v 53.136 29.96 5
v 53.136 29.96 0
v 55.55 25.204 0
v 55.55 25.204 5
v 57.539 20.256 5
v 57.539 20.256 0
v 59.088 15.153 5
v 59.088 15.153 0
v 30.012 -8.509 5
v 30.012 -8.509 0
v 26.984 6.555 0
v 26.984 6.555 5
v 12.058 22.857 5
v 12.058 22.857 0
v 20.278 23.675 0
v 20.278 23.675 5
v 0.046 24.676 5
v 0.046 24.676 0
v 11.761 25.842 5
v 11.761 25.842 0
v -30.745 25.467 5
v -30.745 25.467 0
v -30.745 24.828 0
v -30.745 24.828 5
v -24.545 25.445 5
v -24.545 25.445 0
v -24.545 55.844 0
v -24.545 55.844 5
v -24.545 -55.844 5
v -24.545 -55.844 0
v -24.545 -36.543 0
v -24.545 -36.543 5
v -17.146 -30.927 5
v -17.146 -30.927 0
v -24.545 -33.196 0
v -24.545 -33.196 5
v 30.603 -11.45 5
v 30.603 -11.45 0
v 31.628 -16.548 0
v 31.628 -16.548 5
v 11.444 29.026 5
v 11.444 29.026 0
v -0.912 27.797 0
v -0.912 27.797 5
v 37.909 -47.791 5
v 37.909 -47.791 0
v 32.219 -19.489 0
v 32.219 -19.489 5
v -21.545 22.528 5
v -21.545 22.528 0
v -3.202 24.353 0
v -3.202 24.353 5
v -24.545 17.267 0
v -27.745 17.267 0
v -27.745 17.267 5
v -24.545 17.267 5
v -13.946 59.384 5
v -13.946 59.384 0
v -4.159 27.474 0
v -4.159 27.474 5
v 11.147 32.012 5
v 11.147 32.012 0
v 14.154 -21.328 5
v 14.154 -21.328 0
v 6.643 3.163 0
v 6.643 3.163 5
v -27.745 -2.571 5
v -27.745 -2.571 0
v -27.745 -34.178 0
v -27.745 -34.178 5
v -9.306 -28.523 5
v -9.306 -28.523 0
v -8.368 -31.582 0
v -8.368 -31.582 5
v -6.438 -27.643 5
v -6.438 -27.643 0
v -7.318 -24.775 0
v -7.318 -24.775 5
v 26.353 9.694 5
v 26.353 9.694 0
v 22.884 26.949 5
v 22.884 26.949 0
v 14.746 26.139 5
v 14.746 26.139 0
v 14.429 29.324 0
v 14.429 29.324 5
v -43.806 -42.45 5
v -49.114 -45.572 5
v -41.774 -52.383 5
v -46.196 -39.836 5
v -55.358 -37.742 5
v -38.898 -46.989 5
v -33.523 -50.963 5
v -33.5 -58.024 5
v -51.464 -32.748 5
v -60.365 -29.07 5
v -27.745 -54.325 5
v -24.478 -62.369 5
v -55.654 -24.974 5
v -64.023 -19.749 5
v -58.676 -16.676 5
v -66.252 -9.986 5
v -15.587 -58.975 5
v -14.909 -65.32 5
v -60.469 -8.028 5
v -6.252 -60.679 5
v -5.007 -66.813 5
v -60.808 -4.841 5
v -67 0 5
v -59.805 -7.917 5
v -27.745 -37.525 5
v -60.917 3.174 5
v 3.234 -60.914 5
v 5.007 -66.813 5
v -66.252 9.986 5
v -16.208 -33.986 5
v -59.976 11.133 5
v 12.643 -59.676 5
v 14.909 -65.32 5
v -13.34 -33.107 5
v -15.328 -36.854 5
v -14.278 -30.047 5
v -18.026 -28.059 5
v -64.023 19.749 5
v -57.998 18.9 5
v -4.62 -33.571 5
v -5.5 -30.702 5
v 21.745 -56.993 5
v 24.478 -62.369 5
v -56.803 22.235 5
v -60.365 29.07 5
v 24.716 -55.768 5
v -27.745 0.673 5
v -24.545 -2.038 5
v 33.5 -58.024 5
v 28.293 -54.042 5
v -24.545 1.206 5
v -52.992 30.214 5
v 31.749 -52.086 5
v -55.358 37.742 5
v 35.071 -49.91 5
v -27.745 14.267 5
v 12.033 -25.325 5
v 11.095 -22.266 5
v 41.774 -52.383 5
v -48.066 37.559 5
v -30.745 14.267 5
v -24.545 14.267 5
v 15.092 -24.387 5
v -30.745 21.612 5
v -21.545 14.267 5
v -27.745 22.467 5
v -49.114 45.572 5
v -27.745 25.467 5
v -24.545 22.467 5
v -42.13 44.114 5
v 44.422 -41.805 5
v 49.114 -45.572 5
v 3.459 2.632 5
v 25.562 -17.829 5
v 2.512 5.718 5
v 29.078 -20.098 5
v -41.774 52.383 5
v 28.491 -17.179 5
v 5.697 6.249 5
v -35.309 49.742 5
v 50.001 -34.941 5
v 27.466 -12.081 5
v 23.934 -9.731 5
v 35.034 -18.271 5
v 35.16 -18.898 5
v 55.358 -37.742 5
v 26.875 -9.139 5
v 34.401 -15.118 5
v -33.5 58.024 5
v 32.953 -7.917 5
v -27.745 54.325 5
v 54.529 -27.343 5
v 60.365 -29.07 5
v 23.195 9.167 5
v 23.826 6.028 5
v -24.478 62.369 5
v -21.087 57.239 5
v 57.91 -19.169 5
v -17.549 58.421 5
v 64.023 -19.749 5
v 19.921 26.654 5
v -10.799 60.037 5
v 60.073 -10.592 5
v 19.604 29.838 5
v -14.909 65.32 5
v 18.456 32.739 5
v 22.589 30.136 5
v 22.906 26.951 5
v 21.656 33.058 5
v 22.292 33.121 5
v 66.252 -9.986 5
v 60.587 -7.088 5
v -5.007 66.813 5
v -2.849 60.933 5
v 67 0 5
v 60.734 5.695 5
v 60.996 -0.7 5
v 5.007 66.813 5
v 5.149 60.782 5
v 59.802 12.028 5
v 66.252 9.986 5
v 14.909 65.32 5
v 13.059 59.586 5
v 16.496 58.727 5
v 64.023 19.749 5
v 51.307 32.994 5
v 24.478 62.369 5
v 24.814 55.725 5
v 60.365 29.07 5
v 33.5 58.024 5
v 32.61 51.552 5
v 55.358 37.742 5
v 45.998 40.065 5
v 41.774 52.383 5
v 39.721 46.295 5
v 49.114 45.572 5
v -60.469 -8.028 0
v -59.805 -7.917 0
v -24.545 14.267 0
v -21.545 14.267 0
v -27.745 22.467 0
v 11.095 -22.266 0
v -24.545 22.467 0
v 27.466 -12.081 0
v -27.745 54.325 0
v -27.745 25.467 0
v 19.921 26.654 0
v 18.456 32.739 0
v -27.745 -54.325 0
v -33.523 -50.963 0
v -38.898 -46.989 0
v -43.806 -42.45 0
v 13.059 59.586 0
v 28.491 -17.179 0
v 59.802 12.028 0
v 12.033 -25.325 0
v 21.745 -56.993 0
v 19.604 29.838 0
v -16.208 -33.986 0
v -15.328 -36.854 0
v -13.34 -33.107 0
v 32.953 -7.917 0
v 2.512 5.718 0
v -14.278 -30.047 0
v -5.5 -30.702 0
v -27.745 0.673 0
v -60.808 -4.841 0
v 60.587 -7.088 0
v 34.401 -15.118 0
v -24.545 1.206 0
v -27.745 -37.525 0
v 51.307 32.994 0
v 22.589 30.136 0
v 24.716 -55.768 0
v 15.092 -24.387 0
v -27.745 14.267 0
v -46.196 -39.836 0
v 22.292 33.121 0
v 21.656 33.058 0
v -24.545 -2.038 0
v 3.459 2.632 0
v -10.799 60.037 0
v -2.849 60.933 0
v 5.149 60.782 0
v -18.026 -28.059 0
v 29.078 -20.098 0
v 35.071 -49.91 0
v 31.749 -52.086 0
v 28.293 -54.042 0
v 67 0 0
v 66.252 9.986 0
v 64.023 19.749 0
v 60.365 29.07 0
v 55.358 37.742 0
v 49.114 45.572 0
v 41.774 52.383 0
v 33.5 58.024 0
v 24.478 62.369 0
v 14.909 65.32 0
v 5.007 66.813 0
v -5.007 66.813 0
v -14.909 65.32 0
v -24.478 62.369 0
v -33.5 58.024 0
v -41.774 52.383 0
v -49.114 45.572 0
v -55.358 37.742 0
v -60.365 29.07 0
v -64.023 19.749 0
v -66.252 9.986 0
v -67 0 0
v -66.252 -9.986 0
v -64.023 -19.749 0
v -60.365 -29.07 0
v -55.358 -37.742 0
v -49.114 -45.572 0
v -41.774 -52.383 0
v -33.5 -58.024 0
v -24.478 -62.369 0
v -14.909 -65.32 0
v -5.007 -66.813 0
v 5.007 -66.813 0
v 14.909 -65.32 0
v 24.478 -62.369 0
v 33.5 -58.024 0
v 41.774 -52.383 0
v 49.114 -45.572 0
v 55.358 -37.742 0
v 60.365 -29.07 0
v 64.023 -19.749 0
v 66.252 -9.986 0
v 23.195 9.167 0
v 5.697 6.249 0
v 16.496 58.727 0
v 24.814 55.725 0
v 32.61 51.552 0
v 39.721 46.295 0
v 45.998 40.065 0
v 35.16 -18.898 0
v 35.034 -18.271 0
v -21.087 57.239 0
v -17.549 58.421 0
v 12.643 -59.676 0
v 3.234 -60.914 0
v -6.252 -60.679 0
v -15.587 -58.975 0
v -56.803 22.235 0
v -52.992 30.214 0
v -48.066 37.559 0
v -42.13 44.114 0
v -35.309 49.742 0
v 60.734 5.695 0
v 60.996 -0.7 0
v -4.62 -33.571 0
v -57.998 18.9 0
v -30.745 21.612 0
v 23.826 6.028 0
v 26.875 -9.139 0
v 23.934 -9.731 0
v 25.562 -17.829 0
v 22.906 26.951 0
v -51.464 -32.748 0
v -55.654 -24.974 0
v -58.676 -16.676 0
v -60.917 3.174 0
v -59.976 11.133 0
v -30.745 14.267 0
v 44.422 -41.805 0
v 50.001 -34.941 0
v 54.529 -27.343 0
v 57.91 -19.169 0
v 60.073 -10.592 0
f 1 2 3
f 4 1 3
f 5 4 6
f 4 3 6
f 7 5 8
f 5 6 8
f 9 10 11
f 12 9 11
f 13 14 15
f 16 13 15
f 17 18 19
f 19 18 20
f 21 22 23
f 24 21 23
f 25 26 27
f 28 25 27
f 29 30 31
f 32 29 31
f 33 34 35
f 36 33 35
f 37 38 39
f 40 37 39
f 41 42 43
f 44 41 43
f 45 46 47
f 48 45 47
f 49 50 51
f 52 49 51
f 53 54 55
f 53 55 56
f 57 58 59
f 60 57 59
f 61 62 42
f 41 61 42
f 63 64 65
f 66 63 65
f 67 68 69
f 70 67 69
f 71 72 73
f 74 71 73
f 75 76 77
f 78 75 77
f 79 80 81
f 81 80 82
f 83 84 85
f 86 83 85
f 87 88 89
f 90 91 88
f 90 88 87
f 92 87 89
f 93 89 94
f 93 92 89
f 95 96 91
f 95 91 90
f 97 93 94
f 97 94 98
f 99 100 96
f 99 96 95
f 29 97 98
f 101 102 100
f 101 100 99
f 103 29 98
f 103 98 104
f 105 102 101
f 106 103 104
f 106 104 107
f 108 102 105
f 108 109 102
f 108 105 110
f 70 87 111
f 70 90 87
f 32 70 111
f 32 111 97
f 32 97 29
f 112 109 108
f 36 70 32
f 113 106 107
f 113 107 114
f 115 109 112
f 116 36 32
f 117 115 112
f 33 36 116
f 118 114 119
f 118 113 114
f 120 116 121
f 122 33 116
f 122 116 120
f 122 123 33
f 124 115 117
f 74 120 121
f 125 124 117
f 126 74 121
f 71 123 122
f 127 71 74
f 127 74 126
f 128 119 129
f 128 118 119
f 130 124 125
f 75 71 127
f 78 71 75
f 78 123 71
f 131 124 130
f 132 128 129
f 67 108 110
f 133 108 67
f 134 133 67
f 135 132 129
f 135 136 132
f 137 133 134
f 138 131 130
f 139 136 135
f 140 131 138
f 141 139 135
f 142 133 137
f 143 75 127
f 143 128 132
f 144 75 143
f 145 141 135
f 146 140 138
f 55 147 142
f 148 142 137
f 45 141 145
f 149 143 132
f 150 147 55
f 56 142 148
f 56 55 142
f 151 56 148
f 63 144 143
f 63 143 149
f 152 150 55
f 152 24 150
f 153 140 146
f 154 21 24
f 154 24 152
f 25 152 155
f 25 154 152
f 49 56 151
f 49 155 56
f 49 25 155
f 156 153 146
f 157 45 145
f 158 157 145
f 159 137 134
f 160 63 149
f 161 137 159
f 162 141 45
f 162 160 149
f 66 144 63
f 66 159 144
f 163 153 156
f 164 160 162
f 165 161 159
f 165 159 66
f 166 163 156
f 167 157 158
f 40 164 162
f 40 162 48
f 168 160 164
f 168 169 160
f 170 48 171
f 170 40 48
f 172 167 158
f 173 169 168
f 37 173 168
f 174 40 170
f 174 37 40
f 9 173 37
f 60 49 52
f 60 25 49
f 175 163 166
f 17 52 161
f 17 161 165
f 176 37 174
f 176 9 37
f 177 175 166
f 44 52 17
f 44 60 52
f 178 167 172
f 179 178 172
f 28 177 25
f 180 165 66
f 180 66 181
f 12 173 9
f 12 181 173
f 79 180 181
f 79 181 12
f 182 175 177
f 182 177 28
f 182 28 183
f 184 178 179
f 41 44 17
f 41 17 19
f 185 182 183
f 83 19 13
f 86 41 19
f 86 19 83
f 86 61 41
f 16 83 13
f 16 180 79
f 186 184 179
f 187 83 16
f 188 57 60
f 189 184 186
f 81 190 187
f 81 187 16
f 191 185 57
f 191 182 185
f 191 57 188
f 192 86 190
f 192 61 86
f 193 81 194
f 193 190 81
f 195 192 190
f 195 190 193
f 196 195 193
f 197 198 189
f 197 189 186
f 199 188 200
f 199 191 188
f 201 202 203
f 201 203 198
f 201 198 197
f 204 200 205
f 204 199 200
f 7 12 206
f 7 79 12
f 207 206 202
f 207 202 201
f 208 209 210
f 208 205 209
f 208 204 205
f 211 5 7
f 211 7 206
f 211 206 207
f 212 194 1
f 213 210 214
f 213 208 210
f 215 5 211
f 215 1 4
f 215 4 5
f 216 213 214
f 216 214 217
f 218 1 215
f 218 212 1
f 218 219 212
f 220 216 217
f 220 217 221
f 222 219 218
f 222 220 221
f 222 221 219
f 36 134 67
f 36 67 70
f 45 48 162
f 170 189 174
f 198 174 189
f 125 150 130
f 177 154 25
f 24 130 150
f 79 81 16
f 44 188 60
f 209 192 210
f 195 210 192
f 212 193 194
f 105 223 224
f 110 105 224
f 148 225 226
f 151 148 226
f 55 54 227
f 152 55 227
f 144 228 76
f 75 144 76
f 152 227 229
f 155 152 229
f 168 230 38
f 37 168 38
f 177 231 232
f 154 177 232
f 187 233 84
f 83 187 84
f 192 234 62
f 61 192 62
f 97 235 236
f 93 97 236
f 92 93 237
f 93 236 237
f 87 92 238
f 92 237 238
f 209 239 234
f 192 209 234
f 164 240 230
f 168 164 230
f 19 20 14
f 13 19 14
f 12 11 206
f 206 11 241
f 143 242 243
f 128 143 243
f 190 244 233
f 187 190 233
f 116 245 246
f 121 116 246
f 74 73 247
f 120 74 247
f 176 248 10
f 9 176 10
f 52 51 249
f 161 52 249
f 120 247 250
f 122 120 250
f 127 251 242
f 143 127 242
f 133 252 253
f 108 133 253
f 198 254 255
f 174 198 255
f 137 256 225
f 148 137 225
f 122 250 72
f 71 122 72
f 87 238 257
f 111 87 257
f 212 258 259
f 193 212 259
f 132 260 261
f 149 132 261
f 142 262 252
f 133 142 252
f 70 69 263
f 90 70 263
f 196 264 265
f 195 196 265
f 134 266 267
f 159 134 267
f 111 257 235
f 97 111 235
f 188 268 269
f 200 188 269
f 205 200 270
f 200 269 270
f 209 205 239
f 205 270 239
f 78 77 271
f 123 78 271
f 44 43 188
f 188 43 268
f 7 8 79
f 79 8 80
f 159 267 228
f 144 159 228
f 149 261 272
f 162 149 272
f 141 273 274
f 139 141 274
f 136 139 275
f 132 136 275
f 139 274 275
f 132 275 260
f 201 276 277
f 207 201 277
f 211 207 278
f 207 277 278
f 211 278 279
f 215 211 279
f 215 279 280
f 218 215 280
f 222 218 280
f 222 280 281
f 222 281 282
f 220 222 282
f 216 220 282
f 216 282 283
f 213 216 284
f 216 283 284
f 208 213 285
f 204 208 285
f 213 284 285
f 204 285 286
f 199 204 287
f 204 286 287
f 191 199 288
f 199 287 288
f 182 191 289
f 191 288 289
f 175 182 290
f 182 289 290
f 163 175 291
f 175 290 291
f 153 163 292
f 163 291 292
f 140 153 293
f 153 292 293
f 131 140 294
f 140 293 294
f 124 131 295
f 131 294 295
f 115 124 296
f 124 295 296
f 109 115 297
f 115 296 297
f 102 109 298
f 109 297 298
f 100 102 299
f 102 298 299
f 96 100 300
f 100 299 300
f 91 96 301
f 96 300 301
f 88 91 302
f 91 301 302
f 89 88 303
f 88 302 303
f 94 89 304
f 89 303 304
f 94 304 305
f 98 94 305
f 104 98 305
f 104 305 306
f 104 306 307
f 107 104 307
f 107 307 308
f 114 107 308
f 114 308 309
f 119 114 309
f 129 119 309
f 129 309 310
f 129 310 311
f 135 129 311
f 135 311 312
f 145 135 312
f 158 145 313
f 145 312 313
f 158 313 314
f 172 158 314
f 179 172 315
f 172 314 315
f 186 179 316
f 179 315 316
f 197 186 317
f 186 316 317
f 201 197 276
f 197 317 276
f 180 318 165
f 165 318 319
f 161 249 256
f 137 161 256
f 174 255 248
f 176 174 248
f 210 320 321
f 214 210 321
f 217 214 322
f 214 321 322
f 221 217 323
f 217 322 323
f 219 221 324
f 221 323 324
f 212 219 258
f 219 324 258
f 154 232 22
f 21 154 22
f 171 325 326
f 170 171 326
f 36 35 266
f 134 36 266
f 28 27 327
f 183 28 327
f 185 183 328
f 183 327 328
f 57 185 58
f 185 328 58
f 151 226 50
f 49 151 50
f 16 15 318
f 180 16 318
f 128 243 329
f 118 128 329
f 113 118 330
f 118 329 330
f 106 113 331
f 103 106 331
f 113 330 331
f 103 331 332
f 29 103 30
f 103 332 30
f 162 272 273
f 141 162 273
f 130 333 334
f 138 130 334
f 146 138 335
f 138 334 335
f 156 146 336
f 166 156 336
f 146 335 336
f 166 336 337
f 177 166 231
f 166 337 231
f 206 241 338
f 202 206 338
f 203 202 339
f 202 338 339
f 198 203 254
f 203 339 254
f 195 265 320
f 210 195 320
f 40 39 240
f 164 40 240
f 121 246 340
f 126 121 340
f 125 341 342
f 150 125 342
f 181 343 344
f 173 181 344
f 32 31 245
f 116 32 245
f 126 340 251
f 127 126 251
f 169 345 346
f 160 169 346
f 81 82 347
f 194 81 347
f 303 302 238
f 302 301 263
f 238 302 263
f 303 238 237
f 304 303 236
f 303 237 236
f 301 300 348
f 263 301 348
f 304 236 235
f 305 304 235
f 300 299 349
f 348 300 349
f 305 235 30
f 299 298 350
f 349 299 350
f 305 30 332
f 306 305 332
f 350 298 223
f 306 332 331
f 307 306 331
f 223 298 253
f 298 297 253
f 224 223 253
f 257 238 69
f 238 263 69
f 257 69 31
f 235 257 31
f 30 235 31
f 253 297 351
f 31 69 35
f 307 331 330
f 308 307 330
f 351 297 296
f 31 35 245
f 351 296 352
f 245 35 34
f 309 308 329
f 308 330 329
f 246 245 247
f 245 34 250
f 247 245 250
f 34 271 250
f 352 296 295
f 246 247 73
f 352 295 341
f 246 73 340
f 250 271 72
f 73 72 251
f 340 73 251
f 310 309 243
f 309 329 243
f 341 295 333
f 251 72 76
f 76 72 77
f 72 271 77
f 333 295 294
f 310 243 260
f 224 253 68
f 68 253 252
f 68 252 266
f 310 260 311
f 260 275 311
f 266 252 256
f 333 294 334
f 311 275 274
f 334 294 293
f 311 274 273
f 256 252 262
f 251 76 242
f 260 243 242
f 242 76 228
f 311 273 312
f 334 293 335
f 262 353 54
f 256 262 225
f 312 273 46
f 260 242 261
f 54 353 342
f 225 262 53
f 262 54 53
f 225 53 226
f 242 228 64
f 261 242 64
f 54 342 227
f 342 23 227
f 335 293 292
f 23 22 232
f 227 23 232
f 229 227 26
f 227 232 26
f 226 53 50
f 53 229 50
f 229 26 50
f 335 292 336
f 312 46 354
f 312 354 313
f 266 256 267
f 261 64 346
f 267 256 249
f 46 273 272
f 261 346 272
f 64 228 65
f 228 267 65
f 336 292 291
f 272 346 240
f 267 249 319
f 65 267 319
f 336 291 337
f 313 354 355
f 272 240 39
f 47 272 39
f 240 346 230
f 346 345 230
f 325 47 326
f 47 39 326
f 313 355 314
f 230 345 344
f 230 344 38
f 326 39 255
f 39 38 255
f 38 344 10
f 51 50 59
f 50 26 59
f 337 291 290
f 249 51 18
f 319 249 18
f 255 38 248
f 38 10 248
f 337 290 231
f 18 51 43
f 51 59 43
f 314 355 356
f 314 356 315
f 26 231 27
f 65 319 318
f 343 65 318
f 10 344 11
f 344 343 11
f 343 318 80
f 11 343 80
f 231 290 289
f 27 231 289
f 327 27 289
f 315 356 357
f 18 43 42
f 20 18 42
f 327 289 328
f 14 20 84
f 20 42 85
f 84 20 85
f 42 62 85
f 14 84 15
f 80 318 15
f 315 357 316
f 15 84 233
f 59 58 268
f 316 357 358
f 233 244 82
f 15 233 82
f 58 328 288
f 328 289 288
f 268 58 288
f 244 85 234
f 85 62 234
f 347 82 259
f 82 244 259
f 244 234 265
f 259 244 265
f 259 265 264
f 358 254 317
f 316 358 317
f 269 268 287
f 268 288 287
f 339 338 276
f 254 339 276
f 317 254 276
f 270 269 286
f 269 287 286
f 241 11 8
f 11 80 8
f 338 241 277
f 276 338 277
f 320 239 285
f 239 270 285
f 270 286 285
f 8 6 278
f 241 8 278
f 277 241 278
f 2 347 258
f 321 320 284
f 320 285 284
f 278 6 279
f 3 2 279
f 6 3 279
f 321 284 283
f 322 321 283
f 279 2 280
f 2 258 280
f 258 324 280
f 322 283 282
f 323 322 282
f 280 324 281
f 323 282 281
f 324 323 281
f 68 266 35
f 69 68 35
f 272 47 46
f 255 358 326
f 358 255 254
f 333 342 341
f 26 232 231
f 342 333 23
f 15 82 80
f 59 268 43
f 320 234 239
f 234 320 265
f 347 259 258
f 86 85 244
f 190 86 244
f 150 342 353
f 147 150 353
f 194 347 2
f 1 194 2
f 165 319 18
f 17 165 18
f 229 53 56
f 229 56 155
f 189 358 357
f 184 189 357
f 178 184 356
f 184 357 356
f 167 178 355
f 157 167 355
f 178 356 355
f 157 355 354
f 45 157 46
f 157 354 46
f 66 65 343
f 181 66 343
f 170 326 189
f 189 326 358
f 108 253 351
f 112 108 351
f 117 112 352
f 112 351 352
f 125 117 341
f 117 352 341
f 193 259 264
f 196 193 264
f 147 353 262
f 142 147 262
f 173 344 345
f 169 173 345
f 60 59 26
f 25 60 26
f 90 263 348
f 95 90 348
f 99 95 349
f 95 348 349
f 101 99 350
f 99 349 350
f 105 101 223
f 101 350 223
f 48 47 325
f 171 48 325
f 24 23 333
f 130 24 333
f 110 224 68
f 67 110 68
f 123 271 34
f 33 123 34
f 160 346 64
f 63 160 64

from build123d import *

# Parameters (mm, degrees)
F0_R     = 67
F0_W     = 3.2
F0_H     = 5.2
F1_DEPTH = 5


with BuildPart() as f1:
    # F0 (on Top) → F1 (new body)
    with BuildSketch(Plane.XY):
        Circle(F0_R)
        with BuildLine():
            Line((-43.8061632072, -42.4502068907), (-27.7453339126, -37.5246361488))
            Line((-27.7453339126, -37.5246361488), (-27.7453339126, -54.3249155184))
            ThreePointArc((-27.7453339126, -54.3249155184), (-36.2650846031, -49.0493999834), (-43.8061632072, -42.4502068907))
        make_face(mode=Mode.SUBTRACT)
        with BuildLine():
            Line((-24.5453339126, -36.543253053), (-16.2077082994, -33.9862515417))
            Line((-16.2077082994, -33.9862515417), (-15.32809766, -36.8544016639))
            Line((-15.32809766, -36.8544016639), (-4.620337204, -33.5705219434))
            Line((-4.620337204, -33.5705219434), (-5.4999478434, -30.7023718213))
            Line((-5.4999478434, -30.7023718213), (12.0330121636, -25.3253247681))
            Line((12.0330121636, -25.3253247681), (21.7448194921, -56.9926558888))
            ThreePointArc((21.7448194921, -56.9926558888), (-1.5135076095, -60.9812208365), (-24.5453339126, -55.8437694208))
            Line((-24.5453339126, -55.8437694208), (-24.5453339126, -36.543253053))
        make_face(mode=Mode.SUBTRACT)
        with BuildLine():
            Line((-27.7453339126, -2.5714068584), (-27.7453339126, -34.1775310144))
            Line((-27.7453339126, -34.1775310144), (-46.1961790611, -39.8360771181))
            ThreePointArc((-46.1961790611, -39.8360771181), (-55.6535662863, -24.9735972503), (-60.469385046, -8.0282919824))
            Line((-60.469385046, -8.0282919824), (-59.8046514096, -7.9174446097))
            Line((-59.8046514096, -7.9174446097), (-27.7453339126, -2.5714068584))
        make_face(mode=Mode.SUBTRACT)
        Polygon((-13.3395581772, -33.1066409023), (-14.2778095259, -30.0472807721), (-9.3063493142, -28.5226223304), (-8.3680979656, -31.5819824607), align=None, mode=Mode.SUBTRACT)
        Polygon((-18.0255702875, -28.0587412893), (-17.1459596481, -30.9268914115), (-24.5453339126, -33.1961479186), (-24.5453339126, -2.0377922297), (3.4589808569, 2.6320552794), (11.0947608149, -22.2659646378), (-6.4381991921, -27.643011691), (-7.3178098315, -24.7748615689), align=None, mode=Mode.SUBTRACT)
        with BuildLine():
            Line((15.0923722939, -24.3870734194), (29.0776945802, -20.098023769))
            Line((29.0776945802, -20.098023769), (35.0708025243, -49.9103076559))
            ThreePointArc((35.0708025243, -49.9103076559), (30.0367604433, -53.0923066185), (24.7164230966, -55.7682564665))
            Line((24.7164230966, -55.7682564665), (15.0923722939, -24.3870734194))
        make_face(mode=Mode.SUBTRACT)
        with BuildLine():
            Line((37.9086808974, -47.790500234), (32.2192885129, -19.4890275267))
            Line((32.2192885129, -19.4890275267), (35.16044758, -18.8977717934))
            Line((35.16044758, -18.8977717934), (35.0344853908, -18.2711819544))
            Line((35.0344853908, -18.2711819544), (60.0733303031, -10.5922134746))
            ThreePointArc((60.0733303031, -10.5922134746), (52.402736228, -31.2242411568), (37.9086808974, -47.790500234))
        make_face(mode=Mode.SUBTRACT)
        Polygon((31.6280327797, -16.5478684596), (28.4907964414, -17.1785412418), (27.4659531704, -12.0805321921), (30.6031895087, -11.44985941), align=None, mode=Mode.SUBTRACT)
        Polygon((23.8255728418, 6.0282775984), (26.8746974372, -9.1393731251), (23.9335383701, -9.7306288583), (25.5615882832, -17.8292459105), (14.1541209452, -21.3277132891), (6.6432408292, 3.1630451865), align=None, mode=Mode.SUBTRACT)
        with BuildLine():
            Line((60.5868434596, -7.0876229867), (34.400697228, -15.1184483792))
            Line((34.400697228, -15.1184483792), (32.9530928425, -7.9174446097))
            Line((32.9530928425, -7.9174446097), (30.0119337754, -8.5087003429))
            Line((30.0119337754, -8.5087003429), (26.9837234891, 6.5549136562))
            Line((26.9837234891, 6.5549136562), (59.802483499, 12.0275919182))
            ThreePointArc((59.802483499, 12.0275919182), (60.9487109921, 2.5009255083), (60.5868434596, -7.0876229867))
        make_face(mode=Mode.SUBTRACT)
        with BuildLine():
            Line((-30.7453339126, 14.2669440508), (-27.7453339126, 14.2669440508))
            Line((-27.7453339126, 14.2669440508), (-27.7453339126, 0.6727794143))
            Line((-27.7453339126, 0.6727794143), (-60.8076429886, -4.8405117679))
            ThreePointArc((-60.8076429886, -4.8405117679), (-60.5773112158, 7.1686376578), (-57.9982415713, 18.899840598))
            Line((-57.9982415713, 18.899840598), (-30.7453339126, 21.6120113579))
            Line((-30.7453339126, 21.6120113579), (-30.7453339126, 14.2669440508))
        make_face(mode=Mode.SUBTRACT)
        Polygon((-24.5453339126, 1.206394043), (-24.5453339126, 14.2669440508), (-21.5453339126, 14.2669440508), (-21.5453339126, 22.5275823238), (-3.2024586813, 24.3530392797), (2.5124526937, 5.7184036538), align=None, mode=Mode.SUBTRACT)
        Polygon((0.0455163714, 24.6762731554), (11.7609695409, 25.842178457), (12.0580577422, 22.8569249334), (20.278090913, 23.6749709889), (23.1945533758, 9.1672384904), (5.6967126659, 6.249393561), align=None, mode=Mode.SUBTRACT)
        with Locations((-26.1453339126, 19.8669440508)):
            Rectangle(F0_W, F0_H, mode=Mode.SUBTRACT)
        with BuildLine():
            Line((-27.7453339126, 54.3249155184), (-27.7453339126, 25.4669440508))
            Line((-27.7453339126, 25.4669440508), (-30.7453339126, 25.4669440508))
            Line((-30.7453339126, 25.4669440508), (-30.7453339126, 24.8278186332))
            Line((-30.7453339126, 24.8278186332), (-56.8033838043, 22.2345584255))
            ThreePointArc((-56.8033838043, 22.2345584255), (-45.2169124497, 40.9442404804), (-27.7453339126, 54.3249155184))
        make_face(mode=Mode.SUBTRACT)
        with BuildLine():
            Line((-4.1594807198, 27.4736050776), (-24.5453339126, 25.4448338493))
            Line((-24.5453339126, 25.4448338493), (-24.5453339126, 55.8437694208))
            ThreePointArc((-24.5453339126, 55.8437694208), (-19.3268992288, 57.8573328646), (-13.9459622608, 59.384426718))
            Line((-13.9459622608, 59.384426718), (-4.1594807198, 27.4736050776))
        make_face(mode=Mode.SUBTRACT)
        with BuildLine():
            Line((11.1469872581, 32.011702406), (11.4440754595, 29.0264488823))
            Line((11.4440754595, 29.0264488823), (-0.9115056672, 27.7968389533))
            Line((-0.9115056672, 27.7968389533), (-10.7988456048, 60.036529993))
            ThreePointArc((-10.7988456048, 60.036529993), (1.1523404732, 60.9891146963), (13.0590128663, 59.5857548661))
            Line((13.0590128663, 59.5857548661), (18.4559499448, 32.7390800176))
            Line((18.4559499448, 32.7390800176), (11.1469872581, 32.011702406))
        make_face(mode=Mode.SUBTRACT)
        Polygon((19.6037684242, 29.838489966), (19.9206625056, 26.6542195407), (14.7462230646, 26.1392666584), (14.4293289831, 29.3235370836), align=None, mode=Mode.SUBTRACT)
        with BuildLine():
            Line((22.8839145104, 26.9491181821), (22.9059160293, 26.951307742))
            Line((22.9059160293, 26.951307742), (53.1358049871, 29.9597434631))
            ThreePointArc((53.1358049871, 29.9597434631), (56.5982407155, 22.7516845071), (59.0880479964, 15.1526428049))
            Line((59.0880479964, 15.1526428049), (26.3527040231, 9.6938745483))
            Line((26.3527040231, 9.6938745483), (22.8839145104, 26.9491181821))
        make_face(mode=Mode.SUBTRACT)
        with BuildLine():
            ThreePointArc((16.4956071696, 58.7272930085), (36.2609976032, 49.0524214776), (51.3071590572, 32.9935664862))
            Line((51.3071590572, 32.9935664862), (22.5890219478, 30.1355781673))
            Line((22.5890219478, 30.1355781673), (22.2919337465, 33.120831691))
            Line((22.2919337465, 33.120831691), (21.6559499448, 33.0575394841))
            Line((21.6559499448, 33.0575394841), (16.4956071696, 58.7272930085))
        make_face(mode=Mode.SUBTRACT)
    extrude(amount=F1_DEPTH)


solid = f1.part
